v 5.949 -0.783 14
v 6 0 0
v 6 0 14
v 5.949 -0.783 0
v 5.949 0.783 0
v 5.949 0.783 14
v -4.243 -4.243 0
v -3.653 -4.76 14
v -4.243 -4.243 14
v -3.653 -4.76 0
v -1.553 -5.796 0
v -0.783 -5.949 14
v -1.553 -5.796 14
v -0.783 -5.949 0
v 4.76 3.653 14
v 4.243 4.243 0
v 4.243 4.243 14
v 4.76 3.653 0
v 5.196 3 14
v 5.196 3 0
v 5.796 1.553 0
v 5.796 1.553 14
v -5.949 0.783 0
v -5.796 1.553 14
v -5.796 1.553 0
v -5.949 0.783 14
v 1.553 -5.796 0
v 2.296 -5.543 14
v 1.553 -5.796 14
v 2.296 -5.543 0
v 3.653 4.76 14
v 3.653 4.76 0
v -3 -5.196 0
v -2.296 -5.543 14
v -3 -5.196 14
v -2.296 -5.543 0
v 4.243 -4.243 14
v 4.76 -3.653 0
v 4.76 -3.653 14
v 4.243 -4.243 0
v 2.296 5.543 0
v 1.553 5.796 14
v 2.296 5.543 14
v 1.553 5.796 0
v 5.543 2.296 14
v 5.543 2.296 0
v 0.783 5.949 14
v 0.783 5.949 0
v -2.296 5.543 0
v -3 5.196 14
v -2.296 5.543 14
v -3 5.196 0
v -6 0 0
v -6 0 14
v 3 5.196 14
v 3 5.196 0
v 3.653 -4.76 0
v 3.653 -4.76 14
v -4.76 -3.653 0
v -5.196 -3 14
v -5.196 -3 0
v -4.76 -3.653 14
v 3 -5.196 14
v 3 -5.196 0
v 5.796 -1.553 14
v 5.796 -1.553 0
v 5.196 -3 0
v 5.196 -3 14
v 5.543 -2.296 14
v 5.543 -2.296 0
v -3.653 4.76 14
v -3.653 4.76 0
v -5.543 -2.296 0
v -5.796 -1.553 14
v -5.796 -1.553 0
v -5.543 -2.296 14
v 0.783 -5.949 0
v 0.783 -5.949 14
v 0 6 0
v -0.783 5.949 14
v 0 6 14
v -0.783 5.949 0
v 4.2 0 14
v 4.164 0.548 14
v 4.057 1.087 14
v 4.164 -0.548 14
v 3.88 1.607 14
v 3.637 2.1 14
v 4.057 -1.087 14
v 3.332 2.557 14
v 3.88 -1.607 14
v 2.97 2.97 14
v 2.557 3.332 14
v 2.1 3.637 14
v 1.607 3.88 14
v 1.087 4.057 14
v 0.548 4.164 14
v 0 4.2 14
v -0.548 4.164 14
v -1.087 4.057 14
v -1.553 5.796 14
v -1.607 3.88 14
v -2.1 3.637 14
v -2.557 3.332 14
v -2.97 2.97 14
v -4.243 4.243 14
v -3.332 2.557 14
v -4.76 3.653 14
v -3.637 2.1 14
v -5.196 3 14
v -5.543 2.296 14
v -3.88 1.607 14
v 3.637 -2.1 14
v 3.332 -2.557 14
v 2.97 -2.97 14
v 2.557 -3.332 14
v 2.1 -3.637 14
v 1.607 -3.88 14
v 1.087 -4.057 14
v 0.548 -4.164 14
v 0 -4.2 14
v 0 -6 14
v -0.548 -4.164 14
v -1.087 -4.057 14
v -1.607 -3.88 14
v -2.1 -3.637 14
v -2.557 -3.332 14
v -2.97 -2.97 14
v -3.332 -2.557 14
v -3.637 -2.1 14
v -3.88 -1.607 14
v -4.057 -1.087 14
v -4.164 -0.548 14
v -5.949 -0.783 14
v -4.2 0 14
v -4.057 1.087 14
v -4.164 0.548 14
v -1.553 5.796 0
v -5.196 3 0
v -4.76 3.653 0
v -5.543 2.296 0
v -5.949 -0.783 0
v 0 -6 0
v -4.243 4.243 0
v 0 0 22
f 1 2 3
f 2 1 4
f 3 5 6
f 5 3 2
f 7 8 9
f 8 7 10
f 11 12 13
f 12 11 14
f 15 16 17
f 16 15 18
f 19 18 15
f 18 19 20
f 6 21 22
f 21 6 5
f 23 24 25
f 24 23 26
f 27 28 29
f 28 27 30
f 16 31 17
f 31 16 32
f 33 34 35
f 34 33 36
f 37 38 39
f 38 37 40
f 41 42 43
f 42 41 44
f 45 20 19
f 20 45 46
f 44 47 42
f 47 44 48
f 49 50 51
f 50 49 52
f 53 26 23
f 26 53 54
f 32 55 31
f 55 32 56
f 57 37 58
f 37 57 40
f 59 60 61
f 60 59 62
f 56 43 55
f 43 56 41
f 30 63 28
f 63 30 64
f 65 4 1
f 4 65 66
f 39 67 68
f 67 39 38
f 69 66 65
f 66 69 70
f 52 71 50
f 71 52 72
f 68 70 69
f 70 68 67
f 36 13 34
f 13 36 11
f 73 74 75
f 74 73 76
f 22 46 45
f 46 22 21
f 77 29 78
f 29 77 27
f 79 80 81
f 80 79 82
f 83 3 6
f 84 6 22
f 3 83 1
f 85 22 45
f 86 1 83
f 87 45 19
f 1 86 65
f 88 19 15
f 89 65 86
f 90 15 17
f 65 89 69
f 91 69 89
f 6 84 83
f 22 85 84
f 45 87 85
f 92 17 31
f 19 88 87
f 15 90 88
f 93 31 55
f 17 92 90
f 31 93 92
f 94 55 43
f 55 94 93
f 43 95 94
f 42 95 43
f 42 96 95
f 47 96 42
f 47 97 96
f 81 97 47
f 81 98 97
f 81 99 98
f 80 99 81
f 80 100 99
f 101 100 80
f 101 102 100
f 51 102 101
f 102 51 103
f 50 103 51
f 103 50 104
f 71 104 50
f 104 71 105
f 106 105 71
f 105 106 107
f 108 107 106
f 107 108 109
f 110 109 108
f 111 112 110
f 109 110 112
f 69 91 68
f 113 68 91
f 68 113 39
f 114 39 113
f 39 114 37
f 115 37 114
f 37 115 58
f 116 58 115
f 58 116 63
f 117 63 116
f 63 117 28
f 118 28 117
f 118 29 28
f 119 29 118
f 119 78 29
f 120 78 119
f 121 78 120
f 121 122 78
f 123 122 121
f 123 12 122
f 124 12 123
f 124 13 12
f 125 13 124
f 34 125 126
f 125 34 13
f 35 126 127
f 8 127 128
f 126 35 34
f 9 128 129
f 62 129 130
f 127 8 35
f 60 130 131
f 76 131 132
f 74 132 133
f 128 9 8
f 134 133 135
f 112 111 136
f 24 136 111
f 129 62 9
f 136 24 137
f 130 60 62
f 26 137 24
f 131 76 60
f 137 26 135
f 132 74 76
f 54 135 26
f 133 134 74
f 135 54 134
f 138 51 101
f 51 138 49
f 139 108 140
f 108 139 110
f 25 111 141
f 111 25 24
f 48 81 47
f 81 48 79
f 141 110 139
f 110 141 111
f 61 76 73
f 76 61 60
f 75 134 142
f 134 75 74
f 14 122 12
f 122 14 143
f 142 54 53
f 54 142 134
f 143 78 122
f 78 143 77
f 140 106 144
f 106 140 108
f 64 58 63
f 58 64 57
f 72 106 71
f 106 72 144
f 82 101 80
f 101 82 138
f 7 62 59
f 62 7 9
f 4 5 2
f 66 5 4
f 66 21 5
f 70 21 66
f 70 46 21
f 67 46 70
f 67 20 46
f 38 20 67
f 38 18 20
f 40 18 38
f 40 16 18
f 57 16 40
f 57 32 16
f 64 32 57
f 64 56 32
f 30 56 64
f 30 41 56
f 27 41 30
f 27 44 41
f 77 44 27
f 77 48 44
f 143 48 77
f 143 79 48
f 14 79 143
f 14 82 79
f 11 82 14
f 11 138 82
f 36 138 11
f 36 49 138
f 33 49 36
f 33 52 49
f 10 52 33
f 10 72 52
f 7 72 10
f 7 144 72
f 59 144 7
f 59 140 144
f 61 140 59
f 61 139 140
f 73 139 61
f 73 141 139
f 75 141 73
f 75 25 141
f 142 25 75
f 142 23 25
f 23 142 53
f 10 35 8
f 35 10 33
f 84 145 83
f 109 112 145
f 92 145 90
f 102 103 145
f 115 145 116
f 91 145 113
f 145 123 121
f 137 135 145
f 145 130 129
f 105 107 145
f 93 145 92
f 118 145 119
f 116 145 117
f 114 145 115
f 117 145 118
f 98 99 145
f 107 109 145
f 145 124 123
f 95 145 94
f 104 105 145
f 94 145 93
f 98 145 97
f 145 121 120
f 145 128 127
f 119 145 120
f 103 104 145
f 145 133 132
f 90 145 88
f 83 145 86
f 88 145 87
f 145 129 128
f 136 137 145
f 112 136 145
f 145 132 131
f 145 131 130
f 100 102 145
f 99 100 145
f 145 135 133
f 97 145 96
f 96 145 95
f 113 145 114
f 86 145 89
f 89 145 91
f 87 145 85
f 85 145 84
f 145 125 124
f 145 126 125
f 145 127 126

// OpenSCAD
// Saltmere buoy
// CC0, Saltmere Harbour Office
$fn = 48;
module buoy(r = 6) {
  cylinder(h = 14, r = r);
  translate([0, 0, 14]) cylinder(h = 8, r1 = r * 0.7, r2 = 0);
}
buoy();
